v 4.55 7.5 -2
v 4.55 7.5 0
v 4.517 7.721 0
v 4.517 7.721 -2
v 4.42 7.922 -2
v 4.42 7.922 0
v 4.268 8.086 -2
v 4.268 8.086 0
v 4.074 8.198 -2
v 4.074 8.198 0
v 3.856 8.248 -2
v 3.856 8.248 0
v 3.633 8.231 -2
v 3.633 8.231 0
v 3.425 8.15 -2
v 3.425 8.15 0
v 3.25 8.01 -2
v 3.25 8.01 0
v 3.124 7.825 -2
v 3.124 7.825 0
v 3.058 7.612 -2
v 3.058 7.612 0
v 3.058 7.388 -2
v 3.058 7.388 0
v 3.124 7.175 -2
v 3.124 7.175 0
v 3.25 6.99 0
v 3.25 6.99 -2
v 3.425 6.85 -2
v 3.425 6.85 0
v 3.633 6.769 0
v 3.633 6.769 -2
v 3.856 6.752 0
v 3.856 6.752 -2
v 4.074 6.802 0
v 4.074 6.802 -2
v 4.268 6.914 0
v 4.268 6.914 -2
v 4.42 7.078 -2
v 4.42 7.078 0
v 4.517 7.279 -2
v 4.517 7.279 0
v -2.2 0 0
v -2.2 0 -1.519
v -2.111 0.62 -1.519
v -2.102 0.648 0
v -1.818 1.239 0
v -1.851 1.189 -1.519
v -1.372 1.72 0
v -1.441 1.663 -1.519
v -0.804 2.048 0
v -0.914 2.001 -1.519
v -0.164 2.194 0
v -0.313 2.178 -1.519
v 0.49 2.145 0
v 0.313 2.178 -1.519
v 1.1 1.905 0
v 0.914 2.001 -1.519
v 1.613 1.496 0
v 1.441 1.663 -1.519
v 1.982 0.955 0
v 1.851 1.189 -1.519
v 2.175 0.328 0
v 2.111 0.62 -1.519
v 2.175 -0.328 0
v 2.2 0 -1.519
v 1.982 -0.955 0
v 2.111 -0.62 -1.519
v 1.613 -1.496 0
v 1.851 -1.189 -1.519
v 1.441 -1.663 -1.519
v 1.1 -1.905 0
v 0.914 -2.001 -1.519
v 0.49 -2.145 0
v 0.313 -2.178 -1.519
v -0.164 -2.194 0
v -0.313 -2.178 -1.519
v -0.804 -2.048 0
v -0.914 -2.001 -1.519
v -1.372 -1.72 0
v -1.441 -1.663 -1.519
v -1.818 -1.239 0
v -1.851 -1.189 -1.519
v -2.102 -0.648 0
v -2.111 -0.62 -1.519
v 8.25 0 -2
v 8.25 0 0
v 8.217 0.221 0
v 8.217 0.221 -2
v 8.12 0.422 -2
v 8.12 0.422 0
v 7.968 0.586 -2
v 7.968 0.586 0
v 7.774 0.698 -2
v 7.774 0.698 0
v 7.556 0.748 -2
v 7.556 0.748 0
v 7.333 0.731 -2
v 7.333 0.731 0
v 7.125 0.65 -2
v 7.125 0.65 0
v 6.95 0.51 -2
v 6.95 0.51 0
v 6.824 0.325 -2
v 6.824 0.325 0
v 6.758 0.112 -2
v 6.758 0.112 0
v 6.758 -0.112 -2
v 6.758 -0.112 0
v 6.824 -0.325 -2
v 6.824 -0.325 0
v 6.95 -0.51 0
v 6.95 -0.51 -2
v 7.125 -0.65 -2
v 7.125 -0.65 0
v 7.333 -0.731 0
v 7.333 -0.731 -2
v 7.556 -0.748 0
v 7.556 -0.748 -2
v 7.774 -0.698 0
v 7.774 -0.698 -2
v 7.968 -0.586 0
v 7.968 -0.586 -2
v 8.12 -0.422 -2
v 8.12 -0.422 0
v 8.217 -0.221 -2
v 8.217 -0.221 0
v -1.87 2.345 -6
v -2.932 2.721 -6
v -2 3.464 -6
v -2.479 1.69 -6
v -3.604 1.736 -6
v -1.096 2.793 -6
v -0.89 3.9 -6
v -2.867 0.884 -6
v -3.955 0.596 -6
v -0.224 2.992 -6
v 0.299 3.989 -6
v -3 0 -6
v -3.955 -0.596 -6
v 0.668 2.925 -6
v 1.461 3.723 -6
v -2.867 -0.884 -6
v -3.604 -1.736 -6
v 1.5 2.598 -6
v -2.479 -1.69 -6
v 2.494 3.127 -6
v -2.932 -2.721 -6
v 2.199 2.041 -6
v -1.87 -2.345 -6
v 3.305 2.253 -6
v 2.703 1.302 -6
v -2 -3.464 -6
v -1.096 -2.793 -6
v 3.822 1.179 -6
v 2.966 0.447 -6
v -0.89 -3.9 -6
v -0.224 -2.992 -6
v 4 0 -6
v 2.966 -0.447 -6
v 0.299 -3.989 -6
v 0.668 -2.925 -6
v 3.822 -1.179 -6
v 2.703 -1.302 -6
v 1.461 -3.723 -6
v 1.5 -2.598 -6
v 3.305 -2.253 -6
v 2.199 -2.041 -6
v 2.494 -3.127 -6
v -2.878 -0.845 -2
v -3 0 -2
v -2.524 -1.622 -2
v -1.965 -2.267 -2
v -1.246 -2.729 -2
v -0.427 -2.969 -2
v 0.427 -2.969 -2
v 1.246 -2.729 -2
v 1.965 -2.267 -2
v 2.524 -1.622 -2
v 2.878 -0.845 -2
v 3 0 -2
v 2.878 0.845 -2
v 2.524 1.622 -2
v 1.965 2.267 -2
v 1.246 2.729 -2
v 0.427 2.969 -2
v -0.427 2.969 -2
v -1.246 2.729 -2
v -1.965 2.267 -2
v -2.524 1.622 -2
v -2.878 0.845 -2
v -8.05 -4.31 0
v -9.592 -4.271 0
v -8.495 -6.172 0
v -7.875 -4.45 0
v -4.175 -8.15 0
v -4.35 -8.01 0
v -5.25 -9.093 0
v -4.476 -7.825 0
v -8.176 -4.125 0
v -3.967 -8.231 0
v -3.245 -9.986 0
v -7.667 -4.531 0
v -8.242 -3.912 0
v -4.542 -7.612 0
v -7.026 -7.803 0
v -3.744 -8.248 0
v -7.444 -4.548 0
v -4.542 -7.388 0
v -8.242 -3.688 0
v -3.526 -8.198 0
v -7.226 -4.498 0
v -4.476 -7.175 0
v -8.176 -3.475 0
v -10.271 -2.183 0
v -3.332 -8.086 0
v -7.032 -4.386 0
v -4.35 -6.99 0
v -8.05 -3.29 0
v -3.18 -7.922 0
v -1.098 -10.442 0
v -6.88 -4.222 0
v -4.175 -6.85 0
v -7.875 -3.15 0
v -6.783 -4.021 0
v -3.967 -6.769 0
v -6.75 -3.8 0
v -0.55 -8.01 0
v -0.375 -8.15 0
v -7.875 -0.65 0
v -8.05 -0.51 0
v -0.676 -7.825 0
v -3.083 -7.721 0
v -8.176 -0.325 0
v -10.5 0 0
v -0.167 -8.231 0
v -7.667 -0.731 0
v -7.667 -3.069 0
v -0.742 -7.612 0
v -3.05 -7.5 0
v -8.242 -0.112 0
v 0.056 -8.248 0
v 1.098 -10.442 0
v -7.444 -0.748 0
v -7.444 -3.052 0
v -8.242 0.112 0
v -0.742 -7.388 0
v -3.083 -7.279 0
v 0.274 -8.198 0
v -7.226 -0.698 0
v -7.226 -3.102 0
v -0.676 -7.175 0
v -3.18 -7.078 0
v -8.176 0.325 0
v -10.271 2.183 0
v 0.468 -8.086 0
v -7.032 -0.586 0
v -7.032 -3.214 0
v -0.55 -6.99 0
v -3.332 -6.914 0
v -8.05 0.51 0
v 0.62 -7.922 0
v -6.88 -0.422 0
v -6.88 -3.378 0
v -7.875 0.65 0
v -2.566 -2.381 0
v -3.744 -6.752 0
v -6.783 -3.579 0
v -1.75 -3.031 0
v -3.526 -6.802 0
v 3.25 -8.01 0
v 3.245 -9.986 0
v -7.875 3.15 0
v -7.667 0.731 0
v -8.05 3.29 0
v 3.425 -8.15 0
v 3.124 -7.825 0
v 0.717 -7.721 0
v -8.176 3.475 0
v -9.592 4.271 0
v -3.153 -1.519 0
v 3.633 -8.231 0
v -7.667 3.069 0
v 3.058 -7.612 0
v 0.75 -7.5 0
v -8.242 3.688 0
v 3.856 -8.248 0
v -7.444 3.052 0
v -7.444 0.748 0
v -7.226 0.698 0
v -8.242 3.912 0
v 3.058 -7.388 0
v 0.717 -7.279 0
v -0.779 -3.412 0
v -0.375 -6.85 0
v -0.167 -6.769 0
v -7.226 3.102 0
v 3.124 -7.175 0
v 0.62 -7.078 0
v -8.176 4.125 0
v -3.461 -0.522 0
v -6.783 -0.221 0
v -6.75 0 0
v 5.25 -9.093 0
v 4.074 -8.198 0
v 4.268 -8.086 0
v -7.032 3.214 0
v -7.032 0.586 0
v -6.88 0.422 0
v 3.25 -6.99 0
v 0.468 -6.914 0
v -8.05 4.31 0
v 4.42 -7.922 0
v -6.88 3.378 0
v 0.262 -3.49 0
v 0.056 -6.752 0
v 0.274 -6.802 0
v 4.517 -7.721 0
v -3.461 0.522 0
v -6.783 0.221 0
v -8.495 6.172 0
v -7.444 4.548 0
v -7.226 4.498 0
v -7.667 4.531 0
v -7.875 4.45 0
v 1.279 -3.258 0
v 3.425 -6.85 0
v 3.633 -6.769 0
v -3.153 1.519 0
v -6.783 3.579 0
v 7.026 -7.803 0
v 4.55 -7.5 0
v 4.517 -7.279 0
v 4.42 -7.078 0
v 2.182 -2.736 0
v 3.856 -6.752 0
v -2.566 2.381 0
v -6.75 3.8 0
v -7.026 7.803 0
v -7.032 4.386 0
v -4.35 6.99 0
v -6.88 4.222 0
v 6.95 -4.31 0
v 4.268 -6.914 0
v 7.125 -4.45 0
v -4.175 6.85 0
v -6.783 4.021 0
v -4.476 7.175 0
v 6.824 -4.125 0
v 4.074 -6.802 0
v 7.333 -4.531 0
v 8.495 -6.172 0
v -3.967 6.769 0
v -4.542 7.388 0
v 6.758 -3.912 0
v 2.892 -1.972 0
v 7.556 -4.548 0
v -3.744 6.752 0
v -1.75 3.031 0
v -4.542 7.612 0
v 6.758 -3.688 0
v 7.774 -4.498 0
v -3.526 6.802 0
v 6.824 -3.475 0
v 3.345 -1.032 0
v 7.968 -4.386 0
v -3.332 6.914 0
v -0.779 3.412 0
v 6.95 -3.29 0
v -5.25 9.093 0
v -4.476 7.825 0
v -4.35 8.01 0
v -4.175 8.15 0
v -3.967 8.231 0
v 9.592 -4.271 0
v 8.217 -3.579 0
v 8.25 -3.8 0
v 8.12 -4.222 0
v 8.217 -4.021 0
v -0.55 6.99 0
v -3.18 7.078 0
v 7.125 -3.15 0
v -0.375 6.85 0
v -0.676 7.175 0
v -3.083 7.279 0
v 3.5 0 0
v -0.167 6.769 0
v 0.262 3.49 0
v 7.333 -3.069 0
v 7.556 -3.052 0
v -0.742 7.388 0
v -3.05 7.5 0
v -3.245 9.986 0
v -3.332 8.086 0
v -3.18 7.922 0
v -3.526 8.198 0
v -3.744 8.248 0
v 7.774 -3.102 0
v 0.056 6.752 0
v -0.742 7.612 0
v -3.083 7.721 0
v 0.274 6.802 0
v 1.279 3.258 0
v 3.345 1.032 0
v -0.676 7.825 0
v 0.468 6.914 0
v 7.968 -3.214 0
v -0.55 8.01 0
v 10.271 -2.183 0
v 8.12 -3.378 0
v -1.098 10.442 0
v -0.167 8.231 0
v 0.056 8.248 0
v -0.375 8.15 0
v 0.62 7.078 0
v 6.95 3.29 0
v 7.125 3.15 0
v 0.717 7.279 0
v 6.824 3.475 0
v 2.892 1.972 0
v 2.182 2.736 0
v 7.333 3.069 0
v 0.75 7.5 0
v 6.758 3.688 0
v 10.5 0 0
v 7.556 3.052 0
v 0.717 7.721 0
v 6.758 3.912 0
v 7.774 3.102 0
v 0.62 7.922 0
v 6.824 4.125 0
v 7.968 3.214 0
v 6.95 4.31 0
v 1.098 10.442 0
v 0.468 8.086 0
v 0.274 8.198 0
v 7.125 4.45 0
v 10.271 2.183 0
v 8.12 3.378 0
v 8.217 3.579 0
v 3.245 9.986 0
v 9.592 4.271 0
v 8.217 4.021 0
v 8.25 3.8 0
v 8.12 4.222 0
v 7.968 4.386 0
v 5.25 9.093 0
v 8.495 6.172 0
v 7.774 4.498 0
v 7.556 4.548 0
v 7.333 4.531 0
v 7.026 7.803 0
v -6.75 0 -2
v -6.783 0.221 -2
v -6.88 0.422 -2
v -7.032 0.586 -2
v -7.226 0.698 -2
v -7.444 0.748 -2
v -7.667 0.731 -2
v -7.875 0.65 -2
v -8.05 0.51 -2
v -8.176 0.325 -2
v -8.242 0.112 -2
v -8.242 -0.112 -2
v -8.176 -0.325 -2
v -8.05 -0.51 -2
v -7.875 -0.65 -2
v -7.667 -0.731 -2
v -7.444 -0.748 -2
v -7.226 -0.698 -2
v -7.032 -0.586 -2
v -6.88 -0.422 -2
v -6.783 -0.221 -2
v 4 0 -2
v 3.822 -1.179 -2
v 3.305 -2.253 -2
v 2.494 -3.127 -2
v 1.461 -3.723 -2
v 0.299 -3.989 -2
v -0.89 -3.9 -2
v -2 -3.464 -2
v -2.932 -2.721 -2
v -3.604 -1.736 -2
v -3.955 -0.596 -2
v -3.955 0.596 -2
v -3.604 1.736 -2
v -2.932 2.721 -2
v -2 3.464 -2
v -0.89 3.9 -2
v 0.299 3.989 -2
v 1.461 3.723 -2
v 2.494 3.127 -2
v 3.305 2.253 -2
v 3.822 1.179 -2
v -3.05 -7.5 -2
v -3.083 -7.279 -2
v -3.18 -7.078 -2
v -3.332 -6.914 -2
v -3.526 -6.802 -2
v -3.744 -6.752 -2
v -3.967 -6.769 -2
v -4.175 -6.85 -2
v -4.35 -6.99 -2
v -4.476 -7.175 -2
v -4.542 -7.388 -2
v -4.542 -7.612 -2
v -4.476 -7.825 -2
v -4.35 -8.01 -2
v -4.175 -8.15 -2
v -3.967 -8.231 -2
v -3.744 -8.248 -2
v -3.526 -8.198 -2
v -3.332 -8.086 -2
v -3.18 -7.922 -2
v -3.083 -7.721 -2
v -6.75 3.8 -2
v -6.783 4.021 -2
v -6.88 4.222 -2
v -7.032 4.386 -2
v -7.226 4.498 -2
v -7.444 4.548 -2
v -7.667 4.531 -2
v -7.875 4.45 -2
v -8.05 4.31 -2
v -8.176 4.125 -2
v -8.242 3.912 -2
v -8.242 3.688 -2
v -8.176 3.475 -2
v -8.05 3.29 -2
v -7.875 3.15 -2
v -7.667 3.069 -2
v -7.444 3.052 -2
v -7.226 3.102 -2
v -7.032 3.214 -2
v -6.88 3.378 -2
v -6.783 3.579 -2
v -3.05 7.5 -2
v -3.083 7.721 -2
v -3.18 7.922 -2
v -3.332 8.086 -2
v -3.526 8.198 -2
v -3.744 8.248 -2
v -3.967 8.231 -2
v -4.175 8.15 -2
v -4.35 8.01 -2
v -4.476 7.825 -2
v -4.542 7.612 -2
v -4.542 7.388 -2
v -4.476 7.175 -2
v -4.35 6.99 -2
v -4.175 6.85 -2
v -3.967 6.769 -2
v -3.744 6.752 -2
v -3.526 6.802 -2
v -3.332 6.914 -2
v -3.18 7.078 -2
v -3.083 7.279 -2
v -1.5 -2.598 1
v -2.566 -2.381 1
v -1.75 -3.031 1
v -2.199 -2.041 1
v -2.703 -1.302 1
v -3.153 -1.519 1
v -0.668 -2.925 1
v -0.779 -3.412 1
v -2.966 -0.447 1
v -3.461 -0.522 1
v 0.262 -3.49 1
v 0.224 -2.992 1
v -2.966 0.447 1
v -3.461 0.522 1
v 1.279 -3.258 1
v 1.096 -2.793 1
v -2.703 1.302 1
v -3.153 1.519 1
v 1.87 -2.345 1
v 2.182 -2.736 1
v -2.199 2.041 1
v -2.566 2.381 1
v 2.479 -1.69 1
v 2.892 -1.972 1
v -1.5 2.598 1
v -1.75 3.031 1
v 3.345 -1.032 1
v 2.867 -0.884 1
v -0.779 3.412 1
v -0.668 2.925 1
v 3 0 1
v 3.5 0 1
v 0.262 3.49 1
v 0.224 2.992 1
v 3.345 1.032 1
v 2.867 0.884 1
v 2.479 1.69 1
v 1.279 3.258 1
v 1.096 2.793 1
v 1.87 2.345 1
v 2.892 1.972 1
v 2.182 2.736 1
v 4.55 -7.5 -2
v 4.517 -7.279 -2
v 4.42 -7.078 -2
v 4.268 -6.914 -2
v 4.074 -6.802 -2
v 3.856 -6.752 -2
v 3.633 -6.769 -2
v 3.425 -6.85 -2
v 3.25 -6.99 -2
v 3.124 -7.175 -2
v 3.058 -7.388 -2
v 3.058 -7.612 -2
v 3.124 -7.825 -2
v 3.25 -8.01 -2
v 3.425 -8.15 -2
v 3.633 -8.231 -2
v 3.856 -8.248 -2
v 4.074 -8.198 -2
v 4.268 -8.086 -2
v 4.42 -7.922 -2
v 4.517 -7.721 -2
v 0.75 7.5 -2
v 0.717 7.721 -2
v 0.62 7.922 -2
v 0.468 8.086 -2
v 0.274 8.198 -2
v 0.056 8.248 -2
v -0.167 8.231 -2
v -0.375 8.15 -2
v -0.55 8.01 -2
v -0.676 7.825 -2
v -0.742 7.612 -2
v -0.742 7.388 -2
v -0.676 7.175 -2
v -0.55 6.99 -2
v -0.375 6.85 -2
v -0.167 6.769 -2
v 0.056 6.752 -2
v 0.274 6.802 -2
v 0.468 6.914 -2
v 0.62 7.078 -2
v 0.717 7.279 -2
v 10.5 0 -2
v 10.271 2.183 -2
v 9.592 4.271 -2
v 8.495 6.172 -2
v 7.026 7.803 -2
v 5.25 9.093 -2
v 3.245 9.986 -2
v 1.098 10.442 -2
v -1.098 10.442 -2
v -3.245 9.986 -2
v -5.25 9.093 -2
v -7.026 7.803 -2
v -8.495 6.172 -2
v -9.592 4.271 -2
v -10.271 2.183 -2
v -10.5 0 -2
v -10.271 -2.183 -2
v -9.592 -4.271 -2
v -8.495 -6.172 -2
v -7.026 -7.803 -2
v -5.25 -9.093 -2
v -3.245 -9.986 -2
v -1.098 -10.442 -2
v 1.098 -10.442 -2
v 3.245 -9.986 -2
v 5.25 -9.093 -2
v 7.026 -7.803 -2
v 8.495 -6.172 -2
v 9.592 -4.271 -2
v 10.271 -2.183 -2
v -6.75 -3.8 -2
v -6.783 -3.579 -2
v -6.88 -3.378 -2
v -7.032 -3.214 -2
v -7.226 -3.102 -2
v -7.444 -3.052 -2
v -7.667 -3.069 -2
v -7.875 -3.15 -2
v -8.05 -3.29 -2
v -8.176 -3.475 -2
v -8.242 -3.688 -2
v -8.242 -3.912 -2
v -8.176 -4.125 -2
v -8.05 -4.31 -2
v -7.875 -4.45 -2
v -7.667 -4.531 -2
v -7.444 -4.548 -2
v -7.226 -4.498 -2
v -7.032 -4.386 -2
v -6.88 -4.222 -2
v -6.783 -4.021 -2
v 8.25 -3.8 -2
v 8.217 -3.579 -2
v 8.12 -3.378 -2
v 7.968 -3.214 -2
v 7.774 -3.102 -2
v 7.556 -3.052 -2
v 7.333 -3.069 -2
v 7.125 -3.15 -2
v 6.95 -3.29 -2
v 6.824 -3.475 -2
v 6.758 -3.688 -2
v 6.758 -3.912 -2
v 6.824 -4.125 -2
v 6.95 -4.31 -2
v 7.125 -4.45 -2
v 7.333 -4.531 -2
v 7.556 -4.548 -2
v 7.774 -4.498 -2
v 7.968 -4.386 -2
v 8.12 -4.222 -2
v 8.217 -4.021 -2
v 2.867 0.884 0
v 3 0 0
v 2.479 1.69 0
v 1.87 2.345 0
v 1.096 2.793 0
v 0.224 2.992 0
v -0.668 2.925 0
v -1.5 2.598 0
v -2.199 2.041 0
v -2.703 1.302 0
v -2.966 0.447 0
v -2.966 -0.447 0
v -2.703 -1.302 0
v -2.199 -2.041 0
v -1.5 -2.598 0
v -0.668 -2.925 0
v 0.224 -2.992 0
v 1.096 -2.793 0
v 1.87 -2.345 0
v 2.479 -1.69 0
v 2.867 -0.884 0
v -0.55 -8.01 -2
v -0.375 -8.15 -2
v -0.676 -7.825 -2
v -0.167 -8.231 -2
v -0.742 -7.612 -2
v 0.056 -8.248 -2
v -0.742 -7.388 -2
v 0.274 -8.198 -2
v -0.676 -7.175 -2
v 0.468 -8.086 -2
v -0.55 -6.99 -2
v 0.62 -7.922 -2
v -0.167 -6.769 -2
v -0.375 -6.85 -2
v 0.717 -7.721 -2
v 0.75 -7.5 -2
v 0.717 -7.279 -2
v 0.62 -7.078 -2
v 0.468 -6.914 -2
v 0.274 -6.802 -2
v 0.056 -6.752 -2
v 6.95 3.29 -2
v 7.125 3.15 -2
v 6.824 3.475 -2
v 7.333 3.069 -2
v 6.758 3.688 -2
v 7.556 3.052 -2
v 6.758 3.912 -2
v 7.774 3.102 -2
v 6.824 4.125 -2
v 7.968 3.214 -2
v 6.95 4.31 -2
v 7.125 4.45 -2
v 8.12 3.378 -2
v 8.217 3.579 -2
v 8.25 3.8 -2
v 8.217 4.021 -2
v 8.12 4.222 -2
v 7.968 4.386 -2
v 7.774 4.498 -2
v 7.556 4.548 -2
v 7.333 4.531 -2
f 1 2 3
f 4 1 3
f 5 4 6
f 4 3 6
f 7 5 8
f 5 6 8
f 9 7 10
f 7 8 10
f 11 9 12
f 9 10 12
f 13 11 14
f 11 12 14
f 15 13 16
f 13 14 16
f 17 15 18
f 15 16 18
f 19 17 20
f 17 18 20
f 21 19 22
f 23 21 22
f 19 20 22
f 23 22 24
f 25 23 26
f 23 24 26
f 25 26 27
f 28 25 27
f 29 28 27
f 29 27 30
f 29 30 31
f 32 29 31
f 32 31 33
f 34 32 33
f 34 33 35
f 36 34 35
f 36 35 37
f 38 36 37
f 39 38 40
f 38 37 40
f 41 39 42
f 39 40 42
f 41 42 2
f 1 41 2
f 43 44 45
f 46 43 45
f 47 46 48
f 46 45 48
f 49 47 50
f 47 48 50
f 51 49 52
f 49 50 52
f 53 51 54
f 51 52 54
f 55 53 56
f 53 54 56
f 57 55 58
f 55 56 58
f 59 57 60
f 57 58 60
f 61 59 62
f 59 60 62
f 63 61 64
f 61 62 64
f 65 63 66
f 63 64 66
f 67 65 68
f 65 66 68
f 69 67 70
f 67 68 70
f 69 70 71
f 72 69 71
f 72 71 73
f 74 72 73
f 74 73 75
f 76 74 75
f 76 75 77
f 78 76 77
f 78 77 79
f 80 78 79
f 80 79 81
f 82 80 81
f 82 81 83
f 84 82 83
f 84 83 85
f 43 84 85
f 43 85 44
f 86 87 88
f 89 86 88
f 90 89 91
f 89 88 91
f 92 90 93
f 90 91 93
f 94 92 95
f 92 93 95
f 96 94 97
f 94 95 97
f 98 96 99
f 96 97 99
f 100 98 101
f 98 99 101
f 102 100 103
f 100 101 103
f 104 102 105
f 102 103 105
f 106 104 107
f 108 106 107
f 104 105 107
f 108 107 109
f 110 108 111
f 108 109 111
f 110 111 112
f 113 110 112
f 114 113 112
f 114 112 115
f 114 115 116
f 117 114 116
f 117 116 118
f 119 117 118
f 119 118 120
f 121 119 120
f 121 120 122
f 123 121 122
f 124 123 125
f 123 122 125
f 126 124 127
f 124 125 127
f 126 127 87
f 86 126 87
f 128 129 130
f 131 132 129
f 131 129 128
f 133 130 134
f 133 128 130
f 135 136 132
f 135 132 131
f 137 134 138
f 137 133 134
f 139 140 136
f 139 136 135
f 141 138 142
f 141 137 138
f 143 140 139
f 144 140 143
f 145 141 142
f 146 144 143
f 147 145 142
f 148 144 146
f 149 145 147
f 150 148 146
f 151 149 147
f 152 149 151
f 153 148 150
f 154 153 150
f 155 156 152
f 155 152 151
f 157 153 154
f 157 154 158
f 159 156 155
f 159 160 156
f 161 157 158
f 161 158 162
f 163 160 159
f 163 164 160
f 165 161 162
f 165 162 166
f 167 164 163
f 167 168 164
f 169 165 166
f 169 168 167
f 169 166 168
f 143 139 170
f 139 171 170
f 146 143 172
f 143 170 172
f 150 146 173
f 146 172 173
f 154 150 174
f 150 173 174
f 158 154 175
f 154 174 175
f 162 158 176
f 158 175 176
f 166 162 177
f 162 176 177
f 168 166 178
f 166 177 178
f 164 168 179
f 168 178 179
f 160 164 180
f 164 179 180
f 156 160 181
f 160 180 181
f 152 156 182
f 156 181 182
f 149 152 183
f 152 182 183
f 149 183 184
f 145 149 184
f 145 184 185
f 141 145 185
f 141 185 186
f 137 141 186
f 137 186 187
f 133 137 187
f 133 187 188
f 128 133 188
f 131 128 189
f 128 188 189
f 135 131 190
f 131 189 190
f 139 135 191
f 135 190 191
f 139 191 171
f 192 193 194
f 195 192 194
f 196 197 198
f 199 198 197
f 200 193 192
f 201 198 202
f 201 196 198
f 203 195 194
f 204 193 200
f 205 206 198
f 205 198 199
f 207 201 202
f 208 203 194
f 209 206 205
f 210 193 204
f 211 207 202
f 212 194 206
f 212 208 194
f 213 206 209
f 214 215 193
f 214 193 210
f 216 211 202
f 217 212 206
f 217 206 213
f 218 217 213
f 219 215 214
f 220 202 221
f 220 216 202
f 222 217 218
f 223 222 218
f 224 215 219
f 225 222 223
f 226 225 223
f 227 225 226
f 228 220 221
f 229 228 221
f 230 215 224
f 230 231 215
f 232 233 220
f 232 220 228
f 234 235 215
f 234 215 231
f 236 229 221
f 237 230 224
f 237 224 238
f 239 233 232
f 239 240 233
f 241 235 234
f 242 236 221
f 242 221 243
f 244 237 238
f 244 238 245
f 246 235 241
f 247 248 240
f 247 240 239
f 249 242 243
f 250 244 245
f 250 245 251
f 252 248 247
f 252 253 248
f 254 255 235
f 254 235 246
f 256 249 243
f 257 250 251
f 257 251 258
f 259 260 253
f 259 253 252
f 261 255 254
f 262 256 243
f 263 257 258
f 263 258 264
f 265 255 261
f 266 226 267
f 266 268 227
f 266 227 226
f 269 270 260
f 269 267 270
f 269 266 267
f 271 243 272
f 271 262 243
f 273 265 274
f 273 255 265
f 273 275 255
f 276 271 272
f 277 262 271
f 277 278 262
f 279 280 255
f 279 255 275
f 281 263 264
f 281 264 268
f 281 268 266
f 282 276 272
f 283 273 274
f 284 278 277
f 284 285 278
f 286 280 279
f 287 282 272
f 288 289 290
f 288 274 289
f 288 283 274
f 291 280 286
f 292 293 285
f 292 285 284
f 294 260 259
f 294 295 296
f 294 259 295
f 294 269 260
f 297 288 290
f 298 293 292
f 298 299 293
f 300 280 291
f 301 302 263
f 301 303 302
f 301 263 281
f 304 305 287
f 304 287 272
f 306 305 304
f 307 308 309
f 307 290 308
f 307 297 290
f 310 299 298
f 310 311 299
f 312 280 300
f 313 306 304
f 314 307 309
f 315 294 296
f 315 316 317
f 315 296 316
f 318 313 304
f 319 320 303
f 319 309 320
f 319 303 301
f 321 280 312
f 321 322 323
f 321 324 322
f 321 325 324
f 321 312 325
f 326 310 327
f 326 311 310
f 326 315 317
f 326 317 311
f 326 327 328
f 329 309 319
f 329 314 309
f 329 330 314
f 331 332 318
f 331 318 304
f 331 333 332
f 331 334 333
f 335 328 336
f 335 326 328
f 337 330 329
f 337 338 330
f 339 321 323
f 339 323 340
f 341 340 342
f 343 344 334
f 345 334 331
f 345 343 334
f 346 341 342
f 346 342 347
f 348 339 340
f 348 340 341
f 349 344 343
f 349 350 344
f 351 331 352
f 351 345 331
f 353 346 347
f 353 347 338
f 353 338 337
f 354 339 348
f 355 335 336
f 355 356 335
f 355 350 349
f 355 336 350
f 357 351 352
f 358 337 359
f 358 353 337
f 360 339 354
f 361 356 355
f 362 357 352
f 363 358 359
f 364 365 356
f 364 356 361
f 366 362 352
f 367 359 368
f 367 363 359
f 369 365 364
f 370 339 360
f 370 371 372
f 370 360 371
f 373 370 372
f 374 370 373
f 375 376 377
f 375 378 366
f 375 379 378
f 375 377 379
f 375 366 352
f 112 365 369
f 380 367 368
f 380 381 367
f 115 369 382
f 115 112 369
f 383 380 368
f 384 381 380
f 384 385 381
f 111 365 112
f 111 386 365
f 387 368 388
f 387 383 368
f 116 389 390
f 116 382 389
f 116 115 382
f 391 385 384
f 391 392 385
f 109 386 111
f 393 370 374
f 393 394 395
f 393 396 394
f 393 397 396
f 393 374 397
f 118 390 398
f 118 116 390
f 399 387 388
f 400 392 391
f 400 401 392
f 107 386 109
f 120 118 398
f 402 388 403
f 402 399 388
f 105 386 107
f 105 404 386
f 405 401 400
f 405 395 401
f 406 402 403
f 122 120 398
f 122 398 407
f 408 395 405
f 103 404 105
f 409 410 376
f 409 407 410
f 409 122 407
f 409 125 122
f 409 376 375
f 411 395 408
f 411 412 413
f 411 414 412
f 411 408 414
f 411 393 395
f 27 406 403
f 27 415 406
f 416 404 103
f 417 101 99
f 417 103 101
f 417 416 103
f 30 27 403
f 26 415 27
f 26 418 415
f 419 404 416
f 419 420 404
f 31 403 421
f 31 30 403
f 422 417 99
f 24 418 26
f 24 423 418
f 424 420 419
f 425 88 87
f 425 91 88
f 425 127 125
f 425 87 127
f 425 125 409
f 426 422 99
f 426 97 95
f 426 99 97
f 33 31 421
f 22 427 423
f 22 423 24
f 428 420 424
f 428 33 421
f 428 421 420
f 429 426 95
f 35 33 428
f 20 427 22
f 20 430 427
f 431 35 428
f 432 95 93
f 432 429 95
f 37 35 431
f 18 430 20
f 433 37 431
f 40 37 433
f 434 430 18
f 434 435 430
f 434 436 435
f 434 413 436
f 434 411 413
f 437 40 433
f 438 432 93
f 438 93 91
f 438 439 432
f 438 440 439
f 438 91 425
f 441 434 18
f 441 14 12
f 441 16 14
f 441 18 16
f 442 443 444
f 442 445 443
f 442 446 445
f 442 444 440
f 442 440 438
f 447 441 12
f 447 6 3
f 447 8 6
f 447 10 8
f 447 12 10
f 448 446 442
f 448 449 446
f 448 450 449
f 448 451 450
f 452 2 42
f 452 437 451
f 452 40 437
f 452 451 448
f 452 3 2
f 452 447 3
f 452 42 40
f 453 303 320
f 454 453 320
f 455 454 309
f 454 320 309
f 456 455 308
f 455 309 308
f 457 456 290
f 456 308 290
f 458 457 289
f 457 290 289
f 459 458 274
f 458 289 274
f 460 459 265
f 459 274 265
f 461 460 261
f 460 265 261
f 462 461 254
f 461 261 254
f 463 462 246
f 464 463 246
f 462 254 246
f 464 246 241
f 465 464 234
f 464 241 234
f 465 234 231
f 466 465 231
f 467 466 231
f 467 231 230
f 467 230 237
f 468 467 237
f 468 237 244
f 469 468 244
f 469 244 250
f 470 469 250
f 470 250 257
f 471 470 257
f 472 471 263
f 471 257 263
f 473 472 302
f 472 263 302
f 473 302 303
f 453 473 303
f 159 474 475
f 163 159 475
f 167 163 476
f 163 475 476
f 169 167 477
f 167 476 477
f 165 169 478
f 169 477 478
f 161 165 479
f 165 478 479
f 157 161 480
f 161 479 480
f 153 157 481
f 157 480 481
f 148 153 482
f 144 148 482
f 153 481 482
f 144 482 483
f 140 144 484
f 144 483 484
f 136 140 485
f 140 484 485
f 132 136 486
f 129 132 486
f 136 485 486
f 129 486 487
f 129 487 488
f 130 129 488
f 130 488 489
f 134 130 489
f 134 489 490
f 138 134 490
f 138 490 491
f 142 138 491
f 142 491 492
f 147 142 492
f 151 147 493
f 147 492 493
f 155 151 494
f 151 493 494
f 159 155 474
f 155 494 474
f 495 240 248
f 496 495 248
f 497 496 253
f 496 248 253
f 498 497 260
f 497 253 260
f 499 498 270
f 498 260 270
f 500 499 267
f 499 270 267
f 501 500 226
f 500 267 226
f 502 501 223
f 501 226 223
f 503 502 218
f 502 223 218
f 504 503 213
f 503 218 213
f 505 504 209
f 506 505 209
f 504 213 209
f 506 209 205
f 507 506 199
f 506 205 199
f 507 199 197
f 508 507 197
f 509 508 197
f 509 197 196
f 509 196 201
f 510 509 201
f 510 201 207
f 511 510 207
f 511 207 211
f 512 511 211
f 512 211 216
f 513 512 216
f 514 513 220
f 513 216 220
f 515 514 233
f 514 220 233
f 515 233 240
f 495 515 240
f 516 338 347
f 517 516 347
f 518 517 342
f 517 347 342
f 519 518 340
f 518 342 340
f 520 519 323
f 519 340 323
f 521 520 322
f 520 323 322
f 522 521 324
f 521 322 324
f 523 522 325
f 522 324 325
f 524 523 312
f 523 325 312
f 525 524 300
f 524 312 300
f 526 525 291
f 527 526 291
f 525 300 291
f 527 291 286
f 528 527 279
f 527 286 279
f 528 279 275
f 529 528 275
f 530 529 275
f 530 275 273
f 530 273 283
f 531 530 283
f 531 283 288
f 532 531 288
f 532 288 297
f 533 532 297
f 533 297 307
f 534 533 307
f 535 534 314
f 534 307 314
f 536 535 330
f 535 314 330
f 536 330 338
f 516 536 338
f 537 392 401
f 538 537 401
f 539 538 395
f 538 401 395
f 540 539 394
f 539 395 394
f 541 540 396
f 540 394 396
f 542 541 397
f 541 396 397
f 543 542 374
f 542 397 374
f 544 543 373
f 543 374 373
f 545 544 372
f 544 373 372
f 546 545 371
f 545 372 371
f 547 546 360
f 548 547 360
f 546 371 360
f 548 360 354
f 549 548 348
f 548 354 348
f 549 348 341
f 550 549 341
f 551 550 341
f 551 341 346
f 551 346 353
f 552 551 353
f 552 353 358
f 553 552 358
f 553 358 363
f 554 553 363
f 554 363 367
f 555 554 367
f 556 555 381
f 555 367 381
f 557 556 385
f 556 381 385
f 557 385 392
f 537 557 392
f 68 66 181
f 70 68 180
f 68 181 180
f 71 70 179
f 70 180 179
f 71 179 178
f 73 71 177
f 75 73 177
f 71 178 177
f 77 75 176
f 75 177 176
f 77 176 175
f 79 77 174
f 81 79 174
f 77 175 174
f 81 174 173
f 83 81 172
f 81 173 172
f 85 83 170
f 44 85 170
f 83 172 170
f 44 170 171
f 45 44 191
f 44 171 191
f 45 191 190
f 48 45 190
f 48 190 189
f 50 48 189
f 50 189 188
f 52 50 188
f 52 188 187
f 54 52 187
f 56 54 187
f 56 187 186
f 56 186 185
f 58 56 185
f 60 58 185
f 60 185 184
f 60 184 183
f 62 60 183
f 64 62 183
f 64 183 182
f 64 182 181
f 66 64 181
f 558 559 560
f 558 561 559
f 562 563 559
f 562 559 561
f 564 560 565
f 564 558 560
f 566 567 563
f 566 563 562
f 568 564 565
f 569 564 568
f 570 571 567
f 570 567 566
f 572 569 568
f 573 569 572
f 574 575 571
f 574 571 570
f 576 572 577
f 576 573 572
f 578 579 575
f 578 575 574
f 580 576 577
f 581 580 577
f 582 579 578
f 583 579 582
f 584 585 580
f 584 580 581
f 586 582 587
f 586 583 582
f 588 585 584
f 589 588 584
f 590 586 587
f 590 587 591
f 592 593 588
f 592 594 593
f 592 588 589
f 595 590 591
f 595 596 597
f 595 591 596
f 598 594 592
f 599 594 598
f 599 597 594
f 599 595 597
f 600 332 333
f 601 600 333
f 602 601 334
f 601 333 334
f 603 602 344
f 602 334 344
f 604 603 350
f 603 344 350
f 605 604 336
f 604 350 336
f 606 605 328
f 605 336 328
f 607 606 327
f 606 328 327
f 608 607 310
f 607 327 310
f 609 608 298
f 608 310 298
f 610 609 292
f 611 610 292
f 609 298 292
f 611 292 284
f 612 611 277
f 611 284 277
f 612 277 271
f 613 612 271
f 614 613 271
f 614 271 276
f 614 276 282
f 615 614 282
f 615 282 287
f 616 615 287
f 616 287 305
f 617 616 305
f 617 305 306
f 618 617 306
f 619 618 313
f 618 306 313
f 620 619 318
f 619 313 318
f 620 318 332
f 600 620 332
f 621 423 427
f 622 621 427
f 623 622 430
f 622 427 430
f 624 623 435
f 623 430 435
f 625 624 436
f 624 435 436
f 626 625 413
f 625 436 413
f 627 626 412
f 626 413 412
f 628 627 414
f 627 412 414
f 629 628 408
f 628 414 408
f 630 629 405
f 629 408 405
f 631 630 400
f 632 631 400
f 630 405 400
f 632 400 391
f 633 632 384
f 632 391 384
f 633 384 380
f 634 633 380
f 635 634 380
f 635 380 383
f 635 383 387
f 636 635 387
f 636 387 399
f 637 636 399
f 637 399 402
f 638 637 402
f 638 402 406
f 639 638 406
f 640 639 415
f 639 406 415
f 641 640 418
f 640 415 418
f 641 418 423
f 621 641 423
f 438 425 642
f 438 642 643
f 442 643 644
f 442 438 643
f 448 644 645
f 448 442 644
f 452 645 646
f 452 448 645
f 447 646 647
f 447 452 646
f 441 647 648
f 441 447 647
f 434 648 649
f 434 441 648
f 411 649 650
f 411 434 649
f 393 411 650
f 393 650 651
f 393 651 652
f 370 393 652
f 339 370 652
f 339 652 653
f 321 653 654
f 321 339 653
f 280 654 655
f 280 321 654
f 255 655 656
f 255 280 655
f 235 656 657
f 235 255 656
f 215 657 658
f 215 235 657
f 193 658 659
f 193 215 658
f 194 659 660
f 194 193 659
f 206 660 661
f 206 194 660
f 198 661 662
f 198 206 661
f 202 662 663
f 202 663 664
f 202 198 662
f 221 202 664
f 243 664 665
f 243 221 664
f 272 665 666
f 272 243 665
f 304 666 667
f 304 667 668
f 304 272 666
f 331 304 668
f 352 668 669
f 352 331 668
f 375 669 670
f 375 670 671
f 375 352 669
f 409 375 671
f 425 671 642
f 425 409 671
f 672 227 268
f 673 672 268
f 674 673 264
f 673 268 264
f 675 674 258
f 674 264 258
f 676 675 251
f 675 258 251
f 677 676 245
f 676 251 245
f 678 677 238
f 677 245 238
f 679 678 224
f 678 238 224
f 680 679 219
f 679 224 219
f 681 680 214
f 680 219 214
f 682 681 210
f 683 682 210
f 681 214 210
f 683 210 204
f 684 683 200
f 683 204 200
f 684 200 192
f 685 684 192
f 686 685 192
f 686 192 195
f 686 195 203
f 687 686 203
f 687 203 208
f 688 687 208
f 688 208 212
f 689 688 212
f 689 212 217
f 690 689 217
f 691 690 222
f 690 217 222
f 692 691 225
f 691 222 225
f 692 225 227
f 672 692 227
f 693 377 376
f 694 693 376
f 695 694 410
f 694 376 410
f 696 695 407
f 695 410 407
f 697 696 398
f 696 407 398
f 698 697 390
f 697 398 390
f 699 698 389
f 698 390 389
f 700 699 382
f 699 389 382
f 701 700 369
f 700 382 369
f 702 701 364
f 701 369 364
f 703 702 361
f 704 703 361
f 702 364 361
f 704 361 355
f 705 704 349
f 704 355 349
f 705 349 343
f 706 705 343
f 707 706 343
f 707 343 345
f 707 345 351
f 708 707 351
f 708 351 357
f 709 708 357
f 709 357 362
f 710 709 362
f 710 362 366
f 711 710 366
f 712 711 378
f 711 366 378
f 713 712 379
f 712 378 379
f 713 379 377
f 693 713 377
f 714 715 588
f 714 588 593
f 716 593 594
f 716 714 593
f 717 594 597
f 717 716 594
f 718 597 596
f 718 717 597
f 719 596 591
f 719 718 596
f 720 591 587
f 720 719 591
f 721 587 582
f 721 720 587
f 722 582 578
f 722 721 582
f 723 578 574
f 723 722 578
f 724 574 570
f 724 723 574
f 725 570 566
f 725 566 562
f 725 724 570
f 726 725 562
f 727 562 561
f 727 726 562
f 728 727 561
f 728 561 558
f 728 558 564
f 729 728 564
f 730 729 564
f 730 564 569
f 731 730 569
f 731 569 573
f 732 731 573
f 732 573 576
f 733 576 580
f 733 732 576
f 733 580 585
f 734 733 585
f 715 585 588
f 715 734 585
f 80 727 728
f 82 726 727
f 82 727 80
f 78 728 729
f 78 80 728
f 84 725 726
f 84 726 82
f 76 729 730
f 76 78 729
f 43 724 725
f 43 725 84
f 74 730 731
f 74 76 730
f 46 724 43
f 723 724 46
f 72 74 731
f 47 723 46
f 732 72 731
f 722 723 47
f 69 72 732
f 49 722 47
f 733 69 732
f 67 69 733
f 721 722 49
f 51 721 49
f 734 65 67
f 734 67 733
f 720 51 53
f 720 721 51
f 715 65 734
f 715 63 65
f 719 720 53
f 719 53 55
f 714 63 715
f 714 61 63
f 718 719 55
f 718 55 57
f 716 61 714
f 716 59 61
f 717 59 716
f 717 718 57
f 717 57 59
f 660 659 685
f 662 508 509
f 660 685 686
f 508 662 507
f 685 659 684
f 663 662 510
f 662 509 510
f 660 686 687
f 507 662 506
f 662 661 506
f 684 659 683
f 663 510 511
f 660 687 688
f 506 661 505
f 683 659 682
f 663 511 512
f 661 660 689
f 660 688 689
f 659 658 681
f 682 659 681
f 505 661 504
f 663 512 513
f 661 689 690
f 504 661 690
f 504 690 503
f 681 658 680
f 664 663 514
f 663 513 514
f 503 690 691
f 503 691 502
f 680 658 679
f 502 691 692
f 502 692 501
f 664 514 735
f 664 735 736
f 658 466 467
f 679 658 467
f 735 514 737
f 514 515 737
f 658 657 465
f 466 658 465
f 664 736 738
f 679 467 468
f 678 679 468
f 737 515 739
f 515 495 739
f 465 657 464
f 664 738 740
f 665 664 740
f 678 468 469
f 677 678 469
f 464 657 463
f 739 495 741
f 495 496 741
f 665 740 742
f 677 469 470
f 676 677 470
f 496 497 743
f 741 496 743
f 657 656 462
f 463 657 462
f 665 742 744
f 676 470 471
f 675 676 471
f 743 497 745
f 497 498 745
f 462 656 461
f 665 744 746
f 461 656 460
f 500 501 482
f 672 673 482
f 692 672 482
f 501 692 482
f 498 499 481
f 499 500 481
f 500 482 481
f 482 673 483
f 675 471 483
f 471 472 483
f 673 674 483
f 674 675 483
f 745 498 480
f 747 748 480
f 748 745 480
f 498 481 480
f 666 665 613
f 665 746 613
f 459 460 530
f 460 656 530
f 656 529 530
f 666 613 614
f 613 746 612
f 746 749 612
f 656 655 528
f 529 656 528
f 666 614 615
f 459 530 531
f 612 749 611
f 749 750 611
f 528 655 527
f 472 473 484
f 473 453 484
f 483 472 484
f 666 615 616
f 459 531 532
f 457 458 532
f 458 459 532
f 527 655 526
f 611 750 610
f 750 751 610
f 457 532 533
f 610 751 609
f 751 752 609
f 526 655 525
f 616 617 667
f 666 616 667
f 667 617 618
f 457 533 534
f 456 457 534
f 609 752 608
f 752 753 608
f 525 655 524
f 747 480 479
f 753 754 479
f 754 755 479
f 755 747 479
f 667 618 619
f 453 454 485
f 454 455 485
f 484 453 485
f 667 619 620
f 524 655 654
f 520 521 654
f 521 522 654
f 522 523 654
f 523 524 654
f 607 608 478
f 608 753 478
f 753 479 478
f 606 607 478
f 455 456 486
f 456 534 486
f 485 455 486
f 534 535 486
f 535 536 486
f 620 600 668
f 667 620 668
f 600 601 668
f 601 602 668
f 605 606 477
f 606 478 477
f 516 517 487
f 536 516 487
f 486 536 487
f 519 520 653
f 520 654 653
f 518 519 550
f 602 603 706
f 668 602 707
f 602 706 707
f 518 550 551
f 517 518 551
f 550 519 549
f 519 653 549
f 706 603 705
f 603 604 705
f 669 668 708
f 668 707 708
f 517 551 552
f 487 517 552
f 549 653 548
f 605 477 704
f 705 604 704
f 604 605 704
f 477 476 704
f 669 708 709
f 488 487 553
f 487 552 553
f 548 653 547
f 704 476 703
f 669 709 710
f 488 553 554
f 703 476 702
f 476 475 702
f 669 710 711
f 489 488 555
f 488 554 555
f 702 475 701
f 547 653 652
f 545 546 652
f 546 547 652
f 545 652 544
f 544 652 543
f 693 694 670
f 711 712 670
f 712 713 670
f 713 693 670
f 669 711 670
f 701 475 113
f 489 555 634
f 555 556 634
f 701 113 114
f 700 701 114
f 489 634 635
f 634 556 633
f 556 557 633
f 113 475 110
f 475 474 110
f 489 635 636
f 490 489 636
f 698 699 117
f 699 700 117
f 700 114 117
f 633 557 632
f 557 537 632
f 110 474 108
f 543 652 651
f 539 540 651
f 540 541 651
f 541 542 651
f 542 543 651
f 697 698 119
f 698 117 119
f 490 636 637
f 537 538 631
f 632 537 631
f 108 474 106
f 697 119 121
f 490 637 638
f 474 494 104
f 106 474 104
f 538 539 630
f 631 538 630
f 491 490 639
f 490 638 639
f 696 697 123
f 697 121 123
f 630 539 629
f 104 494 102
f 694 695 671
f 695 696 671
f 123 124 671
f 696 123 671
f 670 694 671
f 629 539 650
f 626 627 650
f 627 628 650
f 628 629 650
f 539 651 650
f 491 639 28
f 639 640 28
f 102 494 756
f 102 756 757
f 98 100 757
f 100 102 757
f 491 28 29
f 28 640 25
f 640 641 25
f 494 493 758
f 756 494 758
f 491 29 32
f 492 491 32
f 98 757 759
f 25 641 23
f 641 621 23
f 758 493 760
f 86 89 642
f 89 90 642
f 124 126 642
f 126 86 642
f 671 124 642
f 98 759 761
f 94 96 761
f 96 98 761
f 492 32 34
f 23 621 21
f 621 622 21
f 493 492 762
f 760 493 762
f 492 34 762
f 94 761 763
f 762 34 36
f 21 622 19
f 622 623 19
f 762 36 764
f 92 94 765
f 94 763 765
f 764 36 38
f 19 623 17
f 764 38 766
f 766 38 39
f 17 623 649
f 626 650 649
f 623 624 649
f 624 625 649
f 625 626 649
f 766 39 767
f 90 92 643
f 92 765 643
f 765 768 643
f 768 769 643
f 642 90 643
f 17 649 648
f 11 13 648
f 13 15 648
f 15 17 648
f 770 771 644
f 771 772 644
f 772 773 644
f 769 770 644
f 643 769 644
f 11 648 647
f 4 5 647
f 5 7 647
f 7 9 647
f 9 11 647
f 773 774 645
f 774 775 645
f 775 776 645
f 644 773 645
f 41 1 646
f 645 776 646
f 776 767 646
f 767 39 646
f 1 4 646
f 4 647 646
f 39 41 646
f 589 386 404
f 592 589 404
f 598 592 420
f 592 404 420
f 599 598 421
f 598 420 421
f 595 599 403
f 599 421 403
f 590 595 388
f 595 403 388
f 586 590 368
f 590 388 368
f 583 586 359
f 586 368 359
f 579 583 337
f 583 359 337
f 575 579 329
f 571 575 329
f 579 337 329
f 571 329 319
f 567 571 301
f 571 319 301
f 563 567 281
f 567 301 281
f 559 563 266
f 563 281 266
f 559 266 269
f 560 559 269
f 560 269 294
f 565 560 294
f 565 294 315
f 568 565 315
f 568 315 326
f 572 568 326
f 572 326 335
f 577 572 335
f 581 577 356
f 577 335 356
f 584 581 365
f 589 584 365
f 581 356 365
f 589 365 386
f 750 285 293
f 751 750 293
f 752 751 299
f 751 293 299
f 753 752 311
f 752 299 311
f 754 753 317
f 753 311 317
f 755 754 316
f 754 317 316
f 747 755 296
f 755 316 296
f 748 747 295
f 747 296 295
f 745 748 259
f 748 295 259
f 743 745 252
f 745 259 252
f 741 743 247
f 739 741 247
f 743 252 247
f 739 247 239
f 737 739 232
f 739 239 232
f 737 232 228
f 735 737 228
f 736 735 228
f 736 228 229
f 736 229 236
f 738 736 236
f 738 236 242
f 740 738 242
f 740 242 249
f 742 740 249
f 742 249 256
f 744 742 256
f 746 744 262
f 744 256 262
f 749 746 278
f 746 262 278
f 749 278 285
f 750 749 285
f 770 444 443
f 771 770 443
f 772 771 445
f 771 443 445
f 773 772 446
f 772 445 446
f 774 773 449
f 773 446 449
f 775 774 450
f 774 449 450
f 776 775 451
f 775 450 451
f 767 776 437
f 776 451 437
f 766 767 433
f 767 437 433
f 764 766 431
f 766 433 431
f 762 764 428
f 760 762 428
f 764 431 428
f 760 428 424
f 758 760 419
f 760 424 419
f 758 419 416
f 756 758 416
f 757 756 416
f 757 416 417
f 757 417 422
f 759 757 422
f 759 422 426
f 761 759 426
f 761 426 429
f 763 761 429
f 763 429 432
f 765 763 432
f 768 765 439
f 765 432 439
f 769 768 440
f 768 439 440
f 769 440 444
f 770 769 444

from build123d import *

# Parameters (mm, degrees)
F0_R     = 10.5
F0_R_2   = 0.75
F0_R_3   = 3.5
F0_R_4   = 3
F1_DEPTH = 2
F2_DEPTH = 1
F3_R     = 4
F4_DEPTH = 4
F6_D     = 4.4
F8_D     = 6
F8_DEPTH = 4
F8_TIP   = 1.8025818571


with BuildPart() as f1:
    # F0 (on Top) → F1 (new body)
    with BuildSketch(Plane.XY):
        Circle(F0_R)
        with Locations((-3.8, -7.5)):
            Circle(F0_R_2, mode=Mode.SUBTRACT)
        with Locations((-7.5, -3.8)):
            Circle(F0_R_2, mode=Mode.SUBTRACT)
        with Locations((0, -7.5)):
            Circle(F0_R_2, mode=Mode.SUBTRACT)
        with Locations((3.8, -7.5)):
            Circle(F0_R_2, mode=Mode.SUBTRACT)
        with Locations((7.5, -3.8)):
            Circle(F0_R_2, mode=Mode.SUBTRACT)
        with Locations((-7.5, 0)):
            Circle(F0_R_2, mode=Mode.SUBTRACT)
        with Locations((-7.5, 3.8)):
            Circle(F0_R_2, mode=Mode.SUBTRACT)
        with Locations((-3.8, 7.5)):
            Circle(F0_R_2, mode=Mode.SUBTRACT)
        Circle(F0_R_3, mode=Mode.SUBTRACT)
        with Locations((7.5, 0)):
            Circle(F0_R_2, mode=Mode.SUBTRACT)
        with Locations((7.5, 3.8)):
            Circle(F0_R_2, mode=Mode.SUBTRACT)
        with Locations((0, 7.5)):
            Circle(F0_R_2, mode=Mode.SUBTRACT)
        with Locations((3.8, 7.5)):
            Circle(F0_R_2, mode=Mode.SUBTRACT)
        Circle(F0_R_3)
        Circle(F0_R_4, mode=Mode.SUBTRACT)
        Circle(F0_R_4)
    extrude(amount=-F1_DEPTH)

    # F0 (on Top) → F2 (join)
    with BuildSketch(Plane.XY):
        Circle(F0_R_3)
        Circle(F0_R_4, mode=Mode.SUBTRACT)
    extrude(amount=F2_DEPTH)

    # F3 (on face) → F4 (join)
    with BuildSketch(Plane(origin=(0, 0, -2), x_dir=(1, 0, 0), z_dir=(0, 0, -1))):
        Circle(F3_R)
    extrude(amount=F4_DEPTH)

    # F6 (through all)
    with Locations(Plane.XY):
        with Locations((0, 0)):
            Hole(F6_D / 2)

    # F8
    with Locations(Plane(origin=(0, 0, -6), x_dir=(1, 0, 0), z_dir=(0, 0, -1))):
        with Locations((0, 0)):
            Hole(F8_D / 2, depth=F8_DEPTH)
            with Locations((0, 0, -(F8_DEPTH + F8_TIP / 2))):  # 118° drill point
                Cone(0, F8_D / 2, F8_TIP, mode=Mode.SUBTRACT)


solid = f1.part
